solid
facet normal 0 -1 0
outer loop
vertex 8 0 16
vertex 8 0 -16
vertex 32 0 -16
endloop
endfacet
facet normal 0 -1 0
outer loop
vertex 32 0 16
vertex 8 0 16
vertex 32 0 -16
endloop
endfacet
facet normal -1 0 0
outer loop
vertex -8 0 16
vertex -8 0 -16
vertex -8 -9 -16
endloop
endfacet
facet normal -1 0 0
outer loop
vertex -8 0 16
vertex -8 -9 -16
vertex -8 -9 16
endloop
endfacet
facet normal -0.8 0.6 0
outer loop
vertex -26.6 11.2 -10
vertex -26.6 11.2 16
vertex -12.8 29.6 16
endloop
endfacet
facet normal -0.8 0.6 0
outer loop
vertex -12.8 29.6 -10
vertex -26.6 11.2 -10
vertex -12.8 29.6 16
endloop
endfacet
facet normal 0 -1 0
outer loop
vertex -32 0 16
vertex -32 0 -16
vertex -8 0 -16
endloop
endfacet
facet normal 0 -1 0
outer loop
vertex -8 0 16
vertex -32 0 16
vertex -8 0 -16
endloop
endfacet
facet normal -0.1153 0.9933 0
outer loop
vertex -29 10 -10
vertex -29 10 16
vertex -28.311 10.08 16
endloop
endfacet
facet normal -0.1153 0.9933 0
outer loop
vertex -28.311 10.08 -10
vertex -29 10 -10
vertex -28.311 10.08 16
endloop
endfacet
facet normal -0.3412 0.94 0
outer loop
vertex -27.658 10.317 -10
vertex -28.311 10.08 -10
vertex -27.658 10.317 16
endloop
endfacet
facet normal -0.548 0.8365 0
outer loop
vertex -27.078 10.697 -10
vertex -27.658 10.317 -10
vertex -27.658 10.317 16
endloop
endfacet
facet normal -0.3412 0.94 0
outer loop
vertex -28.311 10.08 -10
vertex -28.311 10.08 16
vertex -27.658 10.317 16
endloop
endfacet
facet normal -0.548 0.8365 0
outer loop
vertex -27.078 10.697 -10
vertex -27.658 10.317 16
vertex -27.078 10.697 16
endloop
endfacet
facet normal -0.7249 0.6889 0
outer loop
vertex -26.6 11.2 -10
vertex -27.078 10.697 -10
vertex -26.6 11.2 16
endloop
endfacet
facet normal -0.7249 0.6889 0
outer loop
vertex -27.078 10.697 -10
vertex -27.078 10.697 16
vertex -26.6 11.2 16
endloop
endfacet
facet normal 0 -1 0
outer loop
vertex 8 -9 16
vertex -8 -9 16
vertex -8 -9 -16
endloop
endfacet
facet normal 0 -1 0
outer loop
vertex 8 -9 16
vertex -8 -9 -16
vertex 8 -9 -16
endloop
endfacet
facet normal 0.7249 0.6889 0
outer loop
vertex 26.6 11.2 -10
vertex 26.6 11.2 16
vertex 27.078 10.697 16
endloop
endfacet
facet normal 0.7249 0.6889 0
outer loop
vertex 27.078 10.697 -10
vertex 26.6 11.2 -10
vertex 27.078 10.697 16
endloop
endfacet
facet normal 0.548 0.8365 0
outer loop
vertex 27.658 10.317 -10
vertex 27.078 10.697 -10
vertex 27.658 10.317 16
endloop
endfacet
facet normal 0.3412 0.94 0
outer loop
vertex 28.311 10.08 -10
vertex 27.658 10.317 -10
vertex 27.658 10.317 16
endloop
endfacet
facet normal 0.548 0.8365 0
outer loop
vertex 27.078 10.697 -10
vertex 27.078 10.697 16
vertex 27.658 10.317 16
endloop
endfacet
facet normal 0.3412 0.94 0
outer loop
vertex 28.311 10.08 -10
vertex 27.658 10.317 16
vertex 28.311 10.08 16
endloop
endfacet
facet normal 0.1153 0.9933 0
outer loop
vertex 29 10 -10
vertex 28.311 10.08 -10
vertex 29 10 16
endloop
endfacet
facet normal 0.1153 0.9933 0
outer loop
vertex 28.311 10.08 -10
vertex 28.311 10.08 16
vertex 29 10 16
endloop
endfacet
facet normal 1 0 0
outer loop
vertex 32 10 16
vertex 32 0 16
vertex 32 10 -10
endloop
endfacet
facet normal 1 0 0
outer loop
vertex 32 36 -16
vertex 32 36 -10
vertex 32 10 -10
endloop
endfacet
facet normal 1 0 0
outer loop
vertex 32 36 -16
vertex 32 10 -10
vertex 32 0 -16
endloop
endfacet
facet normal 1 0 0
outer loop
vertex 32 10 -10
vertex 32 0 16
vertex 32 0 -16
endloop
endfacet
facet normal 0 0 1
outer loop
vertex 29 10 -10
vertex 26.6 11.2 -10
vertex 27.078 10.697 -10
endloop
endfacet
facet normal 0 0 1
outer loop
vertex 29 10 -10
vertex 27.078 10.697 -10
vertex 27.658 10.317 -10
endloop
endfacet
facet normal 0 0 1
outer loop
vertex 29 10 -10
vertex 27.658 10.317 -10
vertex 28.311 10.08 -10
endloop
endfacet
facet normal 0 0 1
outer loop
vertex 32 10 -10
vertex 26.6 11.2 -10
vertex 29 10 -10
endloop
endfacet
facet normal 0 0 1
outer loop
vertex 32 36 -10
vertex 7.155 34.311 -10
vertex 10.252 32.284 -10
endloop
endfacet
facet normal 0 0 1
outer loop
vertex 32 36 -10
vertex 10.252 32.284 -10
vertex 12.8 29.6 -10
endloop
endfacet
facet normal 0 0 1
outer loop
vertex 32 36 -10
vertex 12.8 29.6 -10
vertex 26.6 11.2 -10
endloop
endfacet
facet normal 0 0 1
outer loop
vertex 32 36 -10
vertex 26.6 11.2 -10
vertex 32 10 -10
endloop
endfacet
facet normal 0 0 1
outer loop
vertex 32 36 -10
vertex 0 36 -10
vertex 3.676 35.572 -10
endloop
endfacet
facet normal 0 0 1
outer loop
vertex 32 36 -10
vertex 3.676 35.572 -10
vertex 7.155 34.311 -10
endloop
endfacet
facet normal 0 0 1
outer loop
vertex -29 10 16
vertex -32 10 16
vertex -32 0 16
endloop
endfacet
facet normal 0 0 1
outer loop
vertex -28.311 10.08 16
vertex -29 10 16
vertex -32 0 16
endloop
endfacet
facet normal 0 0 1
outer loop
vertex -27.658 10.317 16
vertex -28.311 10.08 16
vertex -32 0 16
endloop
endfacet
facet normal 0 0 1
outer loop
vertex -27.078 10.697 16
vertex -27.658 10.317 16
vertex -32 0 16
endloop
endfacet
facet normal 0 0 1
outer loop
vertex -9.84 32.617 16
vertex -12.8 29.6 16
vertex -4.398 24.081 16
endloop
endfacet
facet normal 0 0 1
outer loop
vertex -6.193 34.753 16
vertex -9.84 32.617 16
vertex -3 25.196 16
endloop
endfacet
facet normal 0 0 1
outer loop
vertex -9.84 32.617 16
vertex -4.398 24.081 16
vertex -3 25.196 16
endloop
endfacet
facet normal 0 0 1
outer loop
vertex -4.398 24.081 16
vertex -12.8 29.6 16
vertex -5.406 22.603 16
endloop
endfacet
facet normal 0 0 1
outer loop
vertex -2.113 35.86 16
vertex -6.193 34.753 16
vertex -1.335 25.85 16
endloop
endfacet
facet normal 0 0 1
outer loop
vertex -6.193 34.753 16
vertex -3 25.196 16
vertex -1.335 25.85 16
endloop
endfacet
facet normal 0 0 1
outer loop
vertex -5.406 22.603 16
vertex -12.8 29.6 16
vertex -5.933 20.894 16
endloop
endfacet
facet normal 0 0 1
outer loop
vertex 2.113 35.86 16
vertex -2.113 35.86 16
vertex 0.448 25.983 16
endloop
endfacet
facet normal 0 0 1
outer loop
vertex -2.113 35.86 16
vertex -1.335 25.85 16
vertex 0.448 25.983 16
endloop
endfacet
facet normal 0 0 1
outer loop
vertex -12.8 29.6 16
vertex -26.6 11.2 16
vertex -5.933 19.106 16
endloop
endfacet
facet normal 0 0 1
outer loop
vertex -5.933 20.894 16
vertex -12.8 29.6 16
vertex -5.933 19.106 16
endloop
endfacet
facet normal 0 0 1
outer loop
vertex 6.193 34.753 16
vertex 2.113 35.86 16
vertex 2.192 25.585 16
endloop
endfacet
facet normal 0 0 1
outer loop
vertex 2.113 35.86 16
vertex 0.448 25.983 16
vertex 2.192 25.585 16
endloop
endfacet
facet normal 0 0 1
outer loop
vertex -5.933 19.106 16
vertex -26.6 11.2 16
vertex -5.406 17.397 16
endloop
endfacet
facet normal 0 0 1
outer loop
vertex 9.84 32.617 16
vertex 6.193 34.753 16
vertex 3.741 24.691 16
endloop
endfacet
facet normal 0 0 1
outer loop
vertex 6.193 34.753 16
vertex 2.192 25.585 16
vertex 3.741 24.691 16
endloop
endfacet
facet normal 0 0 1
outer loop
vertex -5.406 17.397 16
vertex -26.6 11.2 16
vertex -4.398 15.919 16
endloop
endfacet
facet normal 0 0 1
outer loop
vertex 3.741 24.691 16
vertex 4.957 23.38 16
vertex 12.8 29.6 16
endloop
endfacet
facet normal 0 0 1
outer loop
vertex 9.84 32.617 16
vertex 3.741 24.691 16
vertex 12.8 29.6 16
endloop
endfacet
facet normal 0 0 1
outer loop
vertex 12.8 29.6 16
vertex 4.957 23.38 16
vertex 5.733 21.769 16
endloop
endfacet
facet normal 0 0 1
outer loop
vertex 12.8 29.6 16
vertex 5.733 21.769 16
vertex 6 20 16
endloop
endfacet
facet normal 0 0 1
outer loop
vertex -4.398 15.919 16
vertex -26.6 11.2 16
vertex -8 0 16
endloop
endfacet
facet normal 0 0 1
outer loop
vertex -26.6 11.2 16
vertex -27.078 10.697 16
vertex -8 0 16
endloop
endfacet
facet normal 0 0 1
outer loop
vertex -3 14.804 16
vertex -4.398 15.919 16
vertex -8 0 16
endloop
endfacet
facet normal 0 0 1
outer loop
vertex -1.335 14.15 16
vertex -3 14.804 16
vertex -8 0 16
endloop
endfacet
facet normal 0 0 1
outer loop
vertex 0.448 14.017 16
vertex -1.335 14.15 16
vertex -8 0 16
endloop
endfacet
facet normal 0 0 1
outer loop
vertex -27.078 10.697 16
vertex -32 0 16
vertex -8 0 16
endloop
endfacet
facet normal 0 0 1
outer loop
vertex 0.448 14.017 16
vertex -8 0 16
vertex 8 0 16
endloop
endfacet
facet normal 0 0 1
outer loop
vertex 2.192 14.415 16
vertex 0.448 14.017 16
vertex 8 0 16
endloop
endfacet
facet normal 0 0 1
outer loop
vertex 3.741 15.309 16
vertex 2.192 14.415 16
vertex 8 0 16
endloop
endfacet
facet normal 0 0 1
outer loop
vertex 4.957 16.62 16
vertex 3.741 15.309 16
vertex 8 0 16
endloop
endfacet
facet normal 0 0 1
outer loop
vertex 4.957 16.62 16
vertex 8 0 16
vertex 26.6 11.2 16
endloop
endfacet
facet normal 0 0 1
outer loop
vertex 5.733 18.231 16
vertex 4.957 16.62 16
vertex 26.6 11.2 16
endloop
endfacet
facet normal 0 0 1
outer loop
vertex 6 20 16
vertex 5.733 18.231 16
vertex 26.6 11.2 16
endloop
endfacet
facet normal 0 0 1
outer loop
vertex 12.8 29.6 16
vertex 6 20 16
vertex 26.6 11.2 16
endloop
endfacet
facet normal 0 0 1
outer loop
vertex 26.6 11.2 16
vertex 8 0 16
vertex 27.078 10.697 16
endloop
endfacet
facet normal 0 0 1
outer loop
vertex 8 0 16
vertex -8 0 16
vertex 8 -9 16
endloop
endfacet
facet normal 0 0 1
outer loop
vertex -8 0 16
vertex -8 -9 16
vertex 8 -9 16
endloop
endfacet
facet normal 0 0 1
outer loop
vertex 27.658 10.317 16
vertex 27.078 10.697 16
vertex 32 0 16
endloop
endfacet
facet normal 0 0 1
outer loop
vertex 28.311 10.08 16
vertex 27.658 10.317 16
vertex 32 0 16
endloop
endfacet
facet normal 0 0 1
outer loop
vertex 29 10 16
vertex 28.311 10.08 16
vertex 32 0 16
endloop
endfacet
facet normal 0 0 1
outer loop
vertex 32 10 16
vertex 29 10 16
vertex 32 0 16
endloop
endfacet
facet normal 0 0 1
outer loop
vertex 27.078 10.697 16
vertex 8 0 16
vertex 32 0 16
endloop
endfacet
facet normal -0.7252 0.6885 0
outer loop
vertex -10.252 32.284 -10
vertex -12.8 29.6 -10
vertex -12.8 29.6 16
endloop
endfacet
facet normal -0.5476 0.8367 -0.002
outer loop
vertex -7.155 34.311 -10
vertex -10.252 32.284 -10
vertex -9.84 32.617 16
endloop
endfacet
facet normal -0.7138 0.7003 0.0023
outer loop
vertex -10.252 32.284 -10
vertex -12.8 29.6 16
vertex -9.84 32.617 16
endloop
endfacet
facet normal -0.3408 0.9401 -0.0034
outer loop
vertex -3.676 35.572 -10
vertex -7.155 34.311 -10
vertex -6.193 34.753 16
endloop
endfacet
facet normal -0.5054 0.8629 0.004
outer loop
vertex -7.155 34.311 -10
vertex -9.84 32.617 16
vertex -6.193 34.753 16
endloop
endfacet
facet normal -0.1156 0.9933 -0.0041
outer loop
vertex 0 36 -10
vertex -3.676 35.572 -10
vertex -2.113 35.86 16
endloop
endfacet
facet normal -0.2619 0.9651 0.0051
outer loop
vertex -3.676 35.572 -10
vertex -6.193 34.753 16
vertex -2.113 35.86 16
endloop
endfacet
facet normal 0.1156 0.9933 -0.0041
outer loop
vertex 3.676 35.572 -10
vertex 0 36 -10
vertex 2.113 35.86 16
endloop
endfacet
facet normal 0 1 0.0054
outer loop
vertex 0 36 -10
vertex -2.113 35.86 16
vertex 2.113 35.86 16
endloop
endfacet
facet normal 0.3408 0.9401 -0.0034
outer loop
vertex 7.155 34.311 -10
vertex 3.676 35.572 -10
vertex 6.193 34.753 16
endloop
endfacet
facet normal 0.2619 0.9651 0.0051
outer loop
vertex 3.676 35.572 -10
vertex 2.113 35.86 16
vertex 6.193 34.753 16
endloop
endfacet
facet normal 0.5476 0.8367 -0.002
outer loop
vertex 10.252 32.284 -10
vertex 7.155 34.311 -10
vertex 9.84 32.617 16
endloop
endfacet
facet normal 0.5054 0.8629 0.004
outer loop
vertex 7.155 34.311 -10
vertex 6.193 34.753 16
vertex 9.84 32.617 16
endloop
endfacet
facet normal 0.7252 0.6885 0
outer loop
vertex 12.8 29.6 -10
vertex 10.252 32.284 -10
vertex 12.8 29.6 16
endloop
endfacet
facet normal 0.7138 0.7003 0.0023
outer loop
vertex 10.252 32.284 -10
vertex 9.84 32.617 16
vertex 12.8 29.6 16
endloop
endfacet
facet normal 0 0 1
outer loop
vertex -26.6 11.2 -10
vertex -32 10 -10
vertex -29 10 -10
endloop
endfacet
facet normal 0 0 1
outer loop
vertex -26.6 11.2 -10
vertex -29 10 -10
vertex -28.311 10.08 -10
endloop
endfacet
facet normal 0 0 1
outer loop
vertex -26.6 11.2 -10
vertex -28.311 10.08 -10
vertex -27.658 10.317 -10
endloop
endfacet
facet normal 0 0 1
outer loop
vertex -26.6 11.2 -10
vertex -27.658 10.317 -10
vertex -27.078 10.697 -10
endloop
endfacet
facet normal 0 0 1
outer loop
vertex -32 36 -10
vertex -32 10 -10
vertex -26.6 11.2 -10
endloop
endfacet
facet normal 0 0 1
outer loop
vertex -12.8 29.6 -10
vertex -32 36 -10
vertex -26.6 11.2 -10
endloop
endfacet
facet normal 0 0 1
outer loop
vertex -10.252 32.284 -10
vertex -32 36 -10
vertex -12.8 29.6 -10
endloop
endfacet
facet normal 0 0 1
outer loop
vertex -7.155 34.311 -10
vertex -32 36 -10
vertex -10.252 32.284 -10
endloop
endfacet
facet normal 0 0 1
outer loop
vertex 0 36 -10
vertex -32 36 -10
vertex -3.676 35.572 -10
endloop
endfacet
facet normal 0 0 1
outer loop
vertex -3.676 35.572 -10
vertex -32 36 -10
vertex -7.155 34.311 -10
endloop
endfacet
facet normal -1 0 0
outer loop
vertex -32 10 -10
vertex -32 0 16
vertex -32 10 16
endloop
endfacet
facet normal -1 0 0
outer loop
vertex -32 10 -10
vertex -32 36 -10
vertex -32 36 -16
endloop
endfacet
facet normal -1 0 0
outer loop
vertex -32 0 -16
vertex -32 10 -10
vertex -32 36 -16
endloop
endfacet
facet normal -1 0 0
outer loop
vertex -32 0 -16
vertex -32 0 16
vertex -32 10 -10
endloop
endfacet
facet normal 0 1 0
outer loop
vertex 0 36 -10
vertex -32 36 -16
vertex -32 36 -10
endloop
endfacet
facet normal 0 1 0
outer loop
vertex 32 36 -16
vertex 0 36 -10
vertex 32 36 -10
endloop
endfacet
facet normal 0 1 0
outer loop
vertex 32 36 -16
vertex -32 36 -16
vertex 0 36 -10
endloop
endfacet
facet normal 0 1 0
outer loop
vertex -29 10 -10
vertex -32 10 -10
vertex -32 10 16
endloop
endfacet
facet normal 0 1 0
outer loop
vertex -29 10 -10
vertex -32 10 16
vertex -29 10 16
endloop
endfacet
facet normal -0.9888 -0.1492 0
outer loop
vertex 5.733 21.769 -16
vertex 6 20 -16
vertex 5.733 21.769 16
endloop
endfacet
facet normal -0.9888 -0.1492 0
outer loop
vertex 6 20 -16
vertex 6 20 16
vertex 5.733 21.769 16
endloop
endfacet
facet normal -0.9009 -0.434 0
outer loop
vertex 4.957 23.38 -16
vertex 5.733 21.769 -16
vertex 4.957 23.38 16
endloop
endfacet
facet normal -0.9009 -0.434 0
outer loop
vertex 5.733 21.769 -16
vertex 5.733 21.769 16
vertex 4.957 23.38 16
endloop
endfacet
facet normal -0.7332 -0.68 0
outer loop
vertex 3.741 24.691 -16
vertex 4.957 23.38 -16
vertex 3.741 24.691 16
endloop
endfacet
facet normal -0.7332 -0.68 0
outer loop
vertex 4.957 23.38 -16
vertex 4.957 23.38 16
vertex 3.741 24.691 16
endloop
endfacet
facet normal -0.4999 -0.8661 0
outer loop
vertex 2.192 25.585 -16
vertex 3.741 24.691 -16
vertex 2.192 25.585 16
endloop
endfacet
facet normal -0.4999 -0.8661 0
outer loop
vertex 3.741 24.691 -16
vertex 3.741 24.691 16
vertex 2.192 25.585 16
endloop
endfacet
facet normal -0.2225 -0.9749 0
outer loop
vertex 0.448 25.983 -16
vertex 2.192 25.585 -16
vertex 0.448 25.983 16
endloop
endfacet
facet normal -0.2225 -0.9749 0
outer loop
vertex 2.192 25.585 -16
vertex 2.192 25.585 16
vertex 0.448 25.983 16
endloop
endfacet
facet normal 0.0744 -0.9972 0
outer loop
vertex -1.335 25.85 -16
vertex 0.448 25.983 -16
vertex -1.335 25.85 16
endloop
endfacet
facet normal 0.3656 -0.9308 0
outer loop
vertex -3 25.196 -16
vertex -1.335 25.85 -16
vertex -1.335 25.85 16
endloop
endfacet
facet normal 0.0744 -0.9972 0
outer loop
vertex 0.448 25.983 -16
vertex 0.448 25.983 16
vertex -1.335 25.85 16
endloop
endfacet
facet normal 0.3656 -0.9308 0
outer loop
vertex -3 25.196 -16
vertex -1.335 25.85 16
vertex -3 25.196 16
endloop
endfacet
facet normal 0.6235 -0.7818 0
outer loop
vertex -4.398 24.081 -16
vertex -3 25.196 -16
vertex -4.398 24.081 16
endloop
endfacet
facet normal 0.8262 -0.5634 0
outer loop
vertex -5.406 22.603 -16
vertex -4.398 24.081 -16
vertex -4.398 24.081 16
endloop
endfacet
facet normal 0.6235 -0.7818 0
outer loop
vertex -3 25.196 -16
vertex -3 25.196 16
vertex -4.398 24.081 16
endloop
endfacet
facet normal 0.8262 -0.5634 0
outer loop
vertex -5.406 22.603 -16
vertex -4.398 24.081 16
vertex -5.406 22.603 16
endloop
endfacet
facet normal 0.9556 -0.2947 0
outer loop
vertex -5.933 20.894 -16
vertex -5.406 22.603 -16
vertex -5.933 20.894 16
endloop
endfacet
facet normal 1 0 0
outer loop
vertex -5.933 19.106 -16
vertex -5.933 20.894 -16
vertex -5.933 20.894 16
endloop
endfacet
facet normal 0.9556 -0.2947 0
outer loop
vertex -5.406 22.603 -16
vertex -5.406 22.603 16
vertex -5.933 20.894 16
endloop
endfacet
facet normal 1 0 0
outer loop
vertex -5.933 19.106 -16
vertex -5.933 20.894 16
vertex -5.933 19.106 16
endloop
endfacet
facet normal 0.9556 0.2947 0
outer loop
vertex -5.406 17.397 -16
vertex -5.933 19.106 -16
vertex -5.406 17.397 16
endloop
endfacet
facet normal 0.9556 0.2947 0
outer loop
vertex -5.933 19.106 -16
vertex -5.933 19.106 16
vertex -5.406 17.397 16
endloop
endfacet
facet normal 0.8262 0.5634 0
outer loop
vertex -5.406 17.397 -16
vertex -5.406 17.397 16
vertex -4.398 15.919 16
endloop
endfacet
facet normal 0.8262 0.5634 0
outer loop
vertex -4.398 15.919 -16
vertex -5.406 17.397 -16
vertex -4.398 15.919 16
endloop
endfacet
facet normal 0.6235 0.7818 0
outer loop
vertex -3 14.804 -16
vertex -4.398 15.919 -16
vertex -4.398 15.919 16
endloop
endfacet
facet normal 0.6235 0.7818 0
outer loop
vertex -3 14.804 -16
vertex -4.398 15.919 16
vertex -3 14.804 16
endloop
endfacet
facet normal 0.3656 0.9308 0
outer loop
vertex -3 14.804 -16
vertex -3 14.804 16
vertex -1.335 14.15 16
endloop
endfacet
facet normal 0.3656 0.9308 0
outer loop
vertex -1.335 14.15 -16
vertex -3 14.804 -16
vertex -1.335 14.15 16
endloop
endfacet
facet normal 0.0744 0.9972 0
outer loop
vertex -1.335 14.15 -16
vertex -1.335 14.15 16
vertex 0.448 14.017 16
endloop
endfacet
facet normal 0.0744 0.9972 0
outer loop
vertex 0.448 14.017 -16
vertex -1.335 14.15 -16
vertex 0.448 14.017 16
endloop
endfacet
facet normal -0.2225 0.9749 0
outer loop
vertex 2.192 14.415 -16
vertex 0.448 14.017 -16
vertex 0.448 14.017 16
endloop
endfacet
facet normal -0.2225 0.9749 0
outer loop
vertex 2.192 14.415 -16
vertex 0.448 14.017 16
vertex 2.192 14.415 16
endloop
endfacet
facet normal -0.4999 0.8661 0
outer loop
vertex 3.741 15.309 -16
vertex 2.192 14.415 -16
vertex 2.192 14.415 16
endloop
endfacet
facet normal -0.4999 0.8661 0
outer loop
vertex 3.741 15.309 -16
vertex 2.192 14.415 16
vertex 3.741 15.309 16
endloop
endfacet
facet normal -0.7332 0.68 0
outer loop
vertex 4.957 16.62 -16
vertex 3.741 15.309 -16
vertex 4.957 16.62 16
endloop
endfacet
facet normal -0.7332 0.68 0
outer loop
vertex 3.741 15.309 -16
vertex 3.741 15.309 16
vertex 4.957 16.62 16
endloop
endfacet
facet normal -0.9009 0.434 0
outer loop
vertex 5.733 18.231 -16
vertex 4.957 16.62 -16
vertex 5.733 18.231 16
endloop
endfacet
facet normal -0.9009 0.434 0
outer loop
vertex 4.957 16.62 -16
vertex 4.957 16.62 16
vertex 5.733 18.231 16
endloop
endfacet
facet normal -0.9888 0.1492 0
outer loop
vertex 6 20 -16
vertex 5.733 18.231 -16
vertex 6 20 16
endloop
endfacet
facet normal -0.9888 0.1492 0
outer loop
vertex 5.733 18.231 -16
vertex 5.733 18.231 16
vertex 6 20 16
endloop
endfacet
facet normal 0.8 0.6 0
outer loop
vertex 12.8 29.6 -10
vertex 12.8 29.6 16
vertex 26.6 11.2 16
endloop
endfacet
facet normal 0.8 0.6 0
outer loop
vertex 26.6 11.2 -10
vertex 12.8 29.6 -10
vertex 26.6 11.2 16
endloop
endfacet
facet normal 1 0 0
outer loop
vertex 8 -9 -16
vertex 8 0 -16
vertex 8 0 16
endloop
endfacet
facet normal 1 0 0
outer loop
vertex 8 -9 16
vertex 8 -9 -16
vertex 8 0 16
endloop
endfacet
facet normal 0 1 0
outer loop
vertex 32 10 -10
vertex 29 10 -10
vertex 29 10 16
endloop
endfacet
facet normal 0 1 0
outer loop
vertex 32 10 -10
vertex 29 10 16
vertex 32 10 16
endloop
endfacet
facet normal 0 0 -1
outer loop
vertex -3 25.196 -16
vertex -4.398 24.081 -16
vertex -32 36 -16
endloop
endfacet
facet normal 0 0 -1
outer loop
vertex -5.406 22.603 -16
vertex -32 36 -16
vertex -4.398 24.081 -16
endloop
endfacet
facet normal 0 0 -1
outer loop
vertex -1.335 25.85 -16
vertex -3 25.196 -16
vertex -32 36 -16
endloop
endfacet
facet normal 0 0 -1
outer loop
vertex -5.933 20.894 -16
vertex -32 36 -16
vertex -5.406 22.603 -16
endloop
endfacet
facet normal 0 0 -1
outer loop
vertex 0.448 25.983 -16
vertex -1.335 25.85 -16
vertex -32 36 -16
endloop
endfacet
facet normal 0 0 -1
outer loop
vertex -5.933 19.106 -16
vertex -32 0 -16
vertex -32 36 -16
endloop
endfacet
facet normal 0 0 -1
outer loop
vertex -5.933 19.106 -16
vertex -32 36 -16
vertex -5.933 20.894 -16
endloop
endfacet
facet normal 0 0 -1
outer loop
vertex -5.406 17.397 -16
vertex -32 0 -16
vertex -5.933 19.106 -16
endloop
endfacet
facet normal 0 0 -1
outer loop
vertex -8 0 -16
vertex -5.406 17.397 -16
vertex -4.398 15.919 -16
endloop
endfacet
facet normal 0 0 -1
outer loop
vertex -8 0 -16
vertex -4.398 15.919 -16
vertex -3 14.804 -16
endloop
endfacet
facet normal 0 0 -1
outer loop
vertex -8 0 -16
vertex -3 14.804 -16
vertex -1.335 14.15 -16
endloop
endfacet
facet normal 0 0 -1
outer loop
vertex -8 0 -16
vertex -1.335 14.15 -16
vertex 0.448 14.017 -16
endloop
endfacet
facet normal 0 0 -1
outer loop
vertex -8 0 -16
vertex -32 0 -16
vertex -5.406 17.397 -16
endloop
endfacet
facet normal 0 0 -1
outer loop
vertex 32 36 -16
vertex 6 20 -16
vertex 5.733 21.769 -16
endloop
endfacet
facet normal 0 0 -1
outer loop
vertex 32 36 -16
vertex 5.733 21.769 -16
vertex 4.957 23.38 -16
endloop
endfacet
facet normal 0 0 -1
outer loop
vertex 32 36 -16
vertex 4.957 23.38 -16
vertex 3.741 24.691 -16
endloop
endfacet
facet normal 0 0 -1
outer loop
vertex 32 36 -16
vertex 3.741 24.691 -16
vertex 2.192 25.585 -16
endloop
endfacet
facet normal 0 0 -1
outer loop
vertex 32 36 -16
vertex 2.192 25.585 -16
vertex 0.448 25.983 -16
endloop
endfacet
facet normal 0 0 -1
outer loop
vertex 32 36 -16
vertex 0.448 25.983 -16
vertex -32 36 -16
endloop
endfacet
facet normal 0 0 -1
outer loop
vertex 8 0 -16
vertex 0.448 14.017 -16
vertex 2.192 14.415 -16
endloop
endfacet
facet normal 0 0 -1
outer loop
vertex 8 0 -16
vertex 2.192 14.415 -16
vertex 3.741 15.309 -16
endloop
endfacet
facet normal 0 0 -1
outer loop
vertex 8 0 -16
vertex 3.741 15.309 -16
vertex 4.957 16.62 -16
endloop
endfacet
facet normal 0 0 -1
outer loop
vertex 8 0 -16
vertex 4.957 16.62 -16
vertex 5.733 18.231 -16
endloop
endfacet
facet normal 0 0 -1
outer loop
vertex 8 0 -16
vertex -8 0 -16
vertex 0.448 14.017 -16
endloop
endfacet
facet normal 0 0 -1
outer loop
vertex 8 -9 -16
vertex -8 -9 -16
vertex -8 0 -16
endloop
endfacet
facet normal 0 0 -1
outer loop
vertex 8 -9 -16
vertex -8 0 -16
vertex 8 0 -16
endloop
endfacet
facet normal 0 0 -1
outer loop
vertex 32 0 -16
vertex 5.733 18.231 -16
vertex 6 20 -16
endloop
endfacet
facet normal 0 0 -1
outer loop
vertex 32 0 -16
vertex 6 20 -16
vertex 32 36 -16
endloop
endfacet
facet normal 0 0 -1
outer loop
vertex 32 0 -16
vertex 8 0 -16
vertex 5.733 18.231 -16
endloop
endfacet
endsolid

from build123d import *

# Parameters (mm, degrees)
SKETCH1_W           = 64
SKETCH1_H           = 32
BOSS_EXTRUDE1_DEPTH = 36
SKETCH3_R           = 6
CUT_EXTRUDE1_DEPTH  = 26
SKETCH4_R           = 6
CUT_EXTRUDE2_DEPTH  = 26
SKETCH5_W           = 16
SKETCH5_H           = 32
BOSS_EXTRUDE3_DEPTH = 9


with BuildPart() as part:
    # Sketch1 → Boss-Extrude1 (new body)
    with BuildSketch(Plane(origin=(0, 0, 0), x_dir=(1, 0, 0), z_dir=(0, 1, 0))):
        Rectangle(SKETCH1_W, SKETCH1_H)
    extrude(amount=BOSS_EXTRUDE1_DEPTH)

    # Sketch3 → Cut-Extrude1 (cut)
    with BuildSketch(Plane.XY.offset(16)):
        with BuildLine():
            Line((-32, 36), (-32, 10))
            Line((-32, 10), (-29, 10))
            ThreePointArc((-29, 10), (-27.658359214, 10.316718427), (-26.6, 11.2))
            Line((-26.6, 11.2), (-12.8, 29.6))
            ThreePointArc((-12.8, 29.6), (-7.155417528, 34.310835056), (0, 36))
            Line((0, 36), (-32, 36))
        make_face()
        with Locations((0, 20)):
            Circle(SKETCH3_R)
        with BuildLine():
            Line((32, 36), (0, 36))
            ThreePointArc((0, 36), (7.155417528, 34.310835056), (12.8, 29.6))
            Line((12.8, 29.6), (26.6, 11.2))
            ThreePointArc((26.6, 11.2), (27.658359214, 10.316718427), (29, 10))
            Line((29, 10), (32, 10))
            Line((32, 10), (32, 36))
        make_face()
    extrude(amount=-CUT_EXTRUDE1_DEPTH, mode=Mode.SUBTRACT)

    # Sketch4 → Cut-Extrude2 (cut)
    with BuildSketch(Plane.XY.offset(-10)):
        with Locations((0, 20)):
            Circle(SKETCH4_R)
    extrude(amount=-CUT_EXTRUDE2_DEPTH, mode=Mode.SUBTRACT)

    # Sketch5 → Boss-Extrude3 (add)
    with BuildSketch(Plane.XZ):
        Rectangle(SKETCH5_W, SKETCH5_H)
    extrude(amount=BOSS_EXTRUDE3_DEPTH)


solid = part.part
